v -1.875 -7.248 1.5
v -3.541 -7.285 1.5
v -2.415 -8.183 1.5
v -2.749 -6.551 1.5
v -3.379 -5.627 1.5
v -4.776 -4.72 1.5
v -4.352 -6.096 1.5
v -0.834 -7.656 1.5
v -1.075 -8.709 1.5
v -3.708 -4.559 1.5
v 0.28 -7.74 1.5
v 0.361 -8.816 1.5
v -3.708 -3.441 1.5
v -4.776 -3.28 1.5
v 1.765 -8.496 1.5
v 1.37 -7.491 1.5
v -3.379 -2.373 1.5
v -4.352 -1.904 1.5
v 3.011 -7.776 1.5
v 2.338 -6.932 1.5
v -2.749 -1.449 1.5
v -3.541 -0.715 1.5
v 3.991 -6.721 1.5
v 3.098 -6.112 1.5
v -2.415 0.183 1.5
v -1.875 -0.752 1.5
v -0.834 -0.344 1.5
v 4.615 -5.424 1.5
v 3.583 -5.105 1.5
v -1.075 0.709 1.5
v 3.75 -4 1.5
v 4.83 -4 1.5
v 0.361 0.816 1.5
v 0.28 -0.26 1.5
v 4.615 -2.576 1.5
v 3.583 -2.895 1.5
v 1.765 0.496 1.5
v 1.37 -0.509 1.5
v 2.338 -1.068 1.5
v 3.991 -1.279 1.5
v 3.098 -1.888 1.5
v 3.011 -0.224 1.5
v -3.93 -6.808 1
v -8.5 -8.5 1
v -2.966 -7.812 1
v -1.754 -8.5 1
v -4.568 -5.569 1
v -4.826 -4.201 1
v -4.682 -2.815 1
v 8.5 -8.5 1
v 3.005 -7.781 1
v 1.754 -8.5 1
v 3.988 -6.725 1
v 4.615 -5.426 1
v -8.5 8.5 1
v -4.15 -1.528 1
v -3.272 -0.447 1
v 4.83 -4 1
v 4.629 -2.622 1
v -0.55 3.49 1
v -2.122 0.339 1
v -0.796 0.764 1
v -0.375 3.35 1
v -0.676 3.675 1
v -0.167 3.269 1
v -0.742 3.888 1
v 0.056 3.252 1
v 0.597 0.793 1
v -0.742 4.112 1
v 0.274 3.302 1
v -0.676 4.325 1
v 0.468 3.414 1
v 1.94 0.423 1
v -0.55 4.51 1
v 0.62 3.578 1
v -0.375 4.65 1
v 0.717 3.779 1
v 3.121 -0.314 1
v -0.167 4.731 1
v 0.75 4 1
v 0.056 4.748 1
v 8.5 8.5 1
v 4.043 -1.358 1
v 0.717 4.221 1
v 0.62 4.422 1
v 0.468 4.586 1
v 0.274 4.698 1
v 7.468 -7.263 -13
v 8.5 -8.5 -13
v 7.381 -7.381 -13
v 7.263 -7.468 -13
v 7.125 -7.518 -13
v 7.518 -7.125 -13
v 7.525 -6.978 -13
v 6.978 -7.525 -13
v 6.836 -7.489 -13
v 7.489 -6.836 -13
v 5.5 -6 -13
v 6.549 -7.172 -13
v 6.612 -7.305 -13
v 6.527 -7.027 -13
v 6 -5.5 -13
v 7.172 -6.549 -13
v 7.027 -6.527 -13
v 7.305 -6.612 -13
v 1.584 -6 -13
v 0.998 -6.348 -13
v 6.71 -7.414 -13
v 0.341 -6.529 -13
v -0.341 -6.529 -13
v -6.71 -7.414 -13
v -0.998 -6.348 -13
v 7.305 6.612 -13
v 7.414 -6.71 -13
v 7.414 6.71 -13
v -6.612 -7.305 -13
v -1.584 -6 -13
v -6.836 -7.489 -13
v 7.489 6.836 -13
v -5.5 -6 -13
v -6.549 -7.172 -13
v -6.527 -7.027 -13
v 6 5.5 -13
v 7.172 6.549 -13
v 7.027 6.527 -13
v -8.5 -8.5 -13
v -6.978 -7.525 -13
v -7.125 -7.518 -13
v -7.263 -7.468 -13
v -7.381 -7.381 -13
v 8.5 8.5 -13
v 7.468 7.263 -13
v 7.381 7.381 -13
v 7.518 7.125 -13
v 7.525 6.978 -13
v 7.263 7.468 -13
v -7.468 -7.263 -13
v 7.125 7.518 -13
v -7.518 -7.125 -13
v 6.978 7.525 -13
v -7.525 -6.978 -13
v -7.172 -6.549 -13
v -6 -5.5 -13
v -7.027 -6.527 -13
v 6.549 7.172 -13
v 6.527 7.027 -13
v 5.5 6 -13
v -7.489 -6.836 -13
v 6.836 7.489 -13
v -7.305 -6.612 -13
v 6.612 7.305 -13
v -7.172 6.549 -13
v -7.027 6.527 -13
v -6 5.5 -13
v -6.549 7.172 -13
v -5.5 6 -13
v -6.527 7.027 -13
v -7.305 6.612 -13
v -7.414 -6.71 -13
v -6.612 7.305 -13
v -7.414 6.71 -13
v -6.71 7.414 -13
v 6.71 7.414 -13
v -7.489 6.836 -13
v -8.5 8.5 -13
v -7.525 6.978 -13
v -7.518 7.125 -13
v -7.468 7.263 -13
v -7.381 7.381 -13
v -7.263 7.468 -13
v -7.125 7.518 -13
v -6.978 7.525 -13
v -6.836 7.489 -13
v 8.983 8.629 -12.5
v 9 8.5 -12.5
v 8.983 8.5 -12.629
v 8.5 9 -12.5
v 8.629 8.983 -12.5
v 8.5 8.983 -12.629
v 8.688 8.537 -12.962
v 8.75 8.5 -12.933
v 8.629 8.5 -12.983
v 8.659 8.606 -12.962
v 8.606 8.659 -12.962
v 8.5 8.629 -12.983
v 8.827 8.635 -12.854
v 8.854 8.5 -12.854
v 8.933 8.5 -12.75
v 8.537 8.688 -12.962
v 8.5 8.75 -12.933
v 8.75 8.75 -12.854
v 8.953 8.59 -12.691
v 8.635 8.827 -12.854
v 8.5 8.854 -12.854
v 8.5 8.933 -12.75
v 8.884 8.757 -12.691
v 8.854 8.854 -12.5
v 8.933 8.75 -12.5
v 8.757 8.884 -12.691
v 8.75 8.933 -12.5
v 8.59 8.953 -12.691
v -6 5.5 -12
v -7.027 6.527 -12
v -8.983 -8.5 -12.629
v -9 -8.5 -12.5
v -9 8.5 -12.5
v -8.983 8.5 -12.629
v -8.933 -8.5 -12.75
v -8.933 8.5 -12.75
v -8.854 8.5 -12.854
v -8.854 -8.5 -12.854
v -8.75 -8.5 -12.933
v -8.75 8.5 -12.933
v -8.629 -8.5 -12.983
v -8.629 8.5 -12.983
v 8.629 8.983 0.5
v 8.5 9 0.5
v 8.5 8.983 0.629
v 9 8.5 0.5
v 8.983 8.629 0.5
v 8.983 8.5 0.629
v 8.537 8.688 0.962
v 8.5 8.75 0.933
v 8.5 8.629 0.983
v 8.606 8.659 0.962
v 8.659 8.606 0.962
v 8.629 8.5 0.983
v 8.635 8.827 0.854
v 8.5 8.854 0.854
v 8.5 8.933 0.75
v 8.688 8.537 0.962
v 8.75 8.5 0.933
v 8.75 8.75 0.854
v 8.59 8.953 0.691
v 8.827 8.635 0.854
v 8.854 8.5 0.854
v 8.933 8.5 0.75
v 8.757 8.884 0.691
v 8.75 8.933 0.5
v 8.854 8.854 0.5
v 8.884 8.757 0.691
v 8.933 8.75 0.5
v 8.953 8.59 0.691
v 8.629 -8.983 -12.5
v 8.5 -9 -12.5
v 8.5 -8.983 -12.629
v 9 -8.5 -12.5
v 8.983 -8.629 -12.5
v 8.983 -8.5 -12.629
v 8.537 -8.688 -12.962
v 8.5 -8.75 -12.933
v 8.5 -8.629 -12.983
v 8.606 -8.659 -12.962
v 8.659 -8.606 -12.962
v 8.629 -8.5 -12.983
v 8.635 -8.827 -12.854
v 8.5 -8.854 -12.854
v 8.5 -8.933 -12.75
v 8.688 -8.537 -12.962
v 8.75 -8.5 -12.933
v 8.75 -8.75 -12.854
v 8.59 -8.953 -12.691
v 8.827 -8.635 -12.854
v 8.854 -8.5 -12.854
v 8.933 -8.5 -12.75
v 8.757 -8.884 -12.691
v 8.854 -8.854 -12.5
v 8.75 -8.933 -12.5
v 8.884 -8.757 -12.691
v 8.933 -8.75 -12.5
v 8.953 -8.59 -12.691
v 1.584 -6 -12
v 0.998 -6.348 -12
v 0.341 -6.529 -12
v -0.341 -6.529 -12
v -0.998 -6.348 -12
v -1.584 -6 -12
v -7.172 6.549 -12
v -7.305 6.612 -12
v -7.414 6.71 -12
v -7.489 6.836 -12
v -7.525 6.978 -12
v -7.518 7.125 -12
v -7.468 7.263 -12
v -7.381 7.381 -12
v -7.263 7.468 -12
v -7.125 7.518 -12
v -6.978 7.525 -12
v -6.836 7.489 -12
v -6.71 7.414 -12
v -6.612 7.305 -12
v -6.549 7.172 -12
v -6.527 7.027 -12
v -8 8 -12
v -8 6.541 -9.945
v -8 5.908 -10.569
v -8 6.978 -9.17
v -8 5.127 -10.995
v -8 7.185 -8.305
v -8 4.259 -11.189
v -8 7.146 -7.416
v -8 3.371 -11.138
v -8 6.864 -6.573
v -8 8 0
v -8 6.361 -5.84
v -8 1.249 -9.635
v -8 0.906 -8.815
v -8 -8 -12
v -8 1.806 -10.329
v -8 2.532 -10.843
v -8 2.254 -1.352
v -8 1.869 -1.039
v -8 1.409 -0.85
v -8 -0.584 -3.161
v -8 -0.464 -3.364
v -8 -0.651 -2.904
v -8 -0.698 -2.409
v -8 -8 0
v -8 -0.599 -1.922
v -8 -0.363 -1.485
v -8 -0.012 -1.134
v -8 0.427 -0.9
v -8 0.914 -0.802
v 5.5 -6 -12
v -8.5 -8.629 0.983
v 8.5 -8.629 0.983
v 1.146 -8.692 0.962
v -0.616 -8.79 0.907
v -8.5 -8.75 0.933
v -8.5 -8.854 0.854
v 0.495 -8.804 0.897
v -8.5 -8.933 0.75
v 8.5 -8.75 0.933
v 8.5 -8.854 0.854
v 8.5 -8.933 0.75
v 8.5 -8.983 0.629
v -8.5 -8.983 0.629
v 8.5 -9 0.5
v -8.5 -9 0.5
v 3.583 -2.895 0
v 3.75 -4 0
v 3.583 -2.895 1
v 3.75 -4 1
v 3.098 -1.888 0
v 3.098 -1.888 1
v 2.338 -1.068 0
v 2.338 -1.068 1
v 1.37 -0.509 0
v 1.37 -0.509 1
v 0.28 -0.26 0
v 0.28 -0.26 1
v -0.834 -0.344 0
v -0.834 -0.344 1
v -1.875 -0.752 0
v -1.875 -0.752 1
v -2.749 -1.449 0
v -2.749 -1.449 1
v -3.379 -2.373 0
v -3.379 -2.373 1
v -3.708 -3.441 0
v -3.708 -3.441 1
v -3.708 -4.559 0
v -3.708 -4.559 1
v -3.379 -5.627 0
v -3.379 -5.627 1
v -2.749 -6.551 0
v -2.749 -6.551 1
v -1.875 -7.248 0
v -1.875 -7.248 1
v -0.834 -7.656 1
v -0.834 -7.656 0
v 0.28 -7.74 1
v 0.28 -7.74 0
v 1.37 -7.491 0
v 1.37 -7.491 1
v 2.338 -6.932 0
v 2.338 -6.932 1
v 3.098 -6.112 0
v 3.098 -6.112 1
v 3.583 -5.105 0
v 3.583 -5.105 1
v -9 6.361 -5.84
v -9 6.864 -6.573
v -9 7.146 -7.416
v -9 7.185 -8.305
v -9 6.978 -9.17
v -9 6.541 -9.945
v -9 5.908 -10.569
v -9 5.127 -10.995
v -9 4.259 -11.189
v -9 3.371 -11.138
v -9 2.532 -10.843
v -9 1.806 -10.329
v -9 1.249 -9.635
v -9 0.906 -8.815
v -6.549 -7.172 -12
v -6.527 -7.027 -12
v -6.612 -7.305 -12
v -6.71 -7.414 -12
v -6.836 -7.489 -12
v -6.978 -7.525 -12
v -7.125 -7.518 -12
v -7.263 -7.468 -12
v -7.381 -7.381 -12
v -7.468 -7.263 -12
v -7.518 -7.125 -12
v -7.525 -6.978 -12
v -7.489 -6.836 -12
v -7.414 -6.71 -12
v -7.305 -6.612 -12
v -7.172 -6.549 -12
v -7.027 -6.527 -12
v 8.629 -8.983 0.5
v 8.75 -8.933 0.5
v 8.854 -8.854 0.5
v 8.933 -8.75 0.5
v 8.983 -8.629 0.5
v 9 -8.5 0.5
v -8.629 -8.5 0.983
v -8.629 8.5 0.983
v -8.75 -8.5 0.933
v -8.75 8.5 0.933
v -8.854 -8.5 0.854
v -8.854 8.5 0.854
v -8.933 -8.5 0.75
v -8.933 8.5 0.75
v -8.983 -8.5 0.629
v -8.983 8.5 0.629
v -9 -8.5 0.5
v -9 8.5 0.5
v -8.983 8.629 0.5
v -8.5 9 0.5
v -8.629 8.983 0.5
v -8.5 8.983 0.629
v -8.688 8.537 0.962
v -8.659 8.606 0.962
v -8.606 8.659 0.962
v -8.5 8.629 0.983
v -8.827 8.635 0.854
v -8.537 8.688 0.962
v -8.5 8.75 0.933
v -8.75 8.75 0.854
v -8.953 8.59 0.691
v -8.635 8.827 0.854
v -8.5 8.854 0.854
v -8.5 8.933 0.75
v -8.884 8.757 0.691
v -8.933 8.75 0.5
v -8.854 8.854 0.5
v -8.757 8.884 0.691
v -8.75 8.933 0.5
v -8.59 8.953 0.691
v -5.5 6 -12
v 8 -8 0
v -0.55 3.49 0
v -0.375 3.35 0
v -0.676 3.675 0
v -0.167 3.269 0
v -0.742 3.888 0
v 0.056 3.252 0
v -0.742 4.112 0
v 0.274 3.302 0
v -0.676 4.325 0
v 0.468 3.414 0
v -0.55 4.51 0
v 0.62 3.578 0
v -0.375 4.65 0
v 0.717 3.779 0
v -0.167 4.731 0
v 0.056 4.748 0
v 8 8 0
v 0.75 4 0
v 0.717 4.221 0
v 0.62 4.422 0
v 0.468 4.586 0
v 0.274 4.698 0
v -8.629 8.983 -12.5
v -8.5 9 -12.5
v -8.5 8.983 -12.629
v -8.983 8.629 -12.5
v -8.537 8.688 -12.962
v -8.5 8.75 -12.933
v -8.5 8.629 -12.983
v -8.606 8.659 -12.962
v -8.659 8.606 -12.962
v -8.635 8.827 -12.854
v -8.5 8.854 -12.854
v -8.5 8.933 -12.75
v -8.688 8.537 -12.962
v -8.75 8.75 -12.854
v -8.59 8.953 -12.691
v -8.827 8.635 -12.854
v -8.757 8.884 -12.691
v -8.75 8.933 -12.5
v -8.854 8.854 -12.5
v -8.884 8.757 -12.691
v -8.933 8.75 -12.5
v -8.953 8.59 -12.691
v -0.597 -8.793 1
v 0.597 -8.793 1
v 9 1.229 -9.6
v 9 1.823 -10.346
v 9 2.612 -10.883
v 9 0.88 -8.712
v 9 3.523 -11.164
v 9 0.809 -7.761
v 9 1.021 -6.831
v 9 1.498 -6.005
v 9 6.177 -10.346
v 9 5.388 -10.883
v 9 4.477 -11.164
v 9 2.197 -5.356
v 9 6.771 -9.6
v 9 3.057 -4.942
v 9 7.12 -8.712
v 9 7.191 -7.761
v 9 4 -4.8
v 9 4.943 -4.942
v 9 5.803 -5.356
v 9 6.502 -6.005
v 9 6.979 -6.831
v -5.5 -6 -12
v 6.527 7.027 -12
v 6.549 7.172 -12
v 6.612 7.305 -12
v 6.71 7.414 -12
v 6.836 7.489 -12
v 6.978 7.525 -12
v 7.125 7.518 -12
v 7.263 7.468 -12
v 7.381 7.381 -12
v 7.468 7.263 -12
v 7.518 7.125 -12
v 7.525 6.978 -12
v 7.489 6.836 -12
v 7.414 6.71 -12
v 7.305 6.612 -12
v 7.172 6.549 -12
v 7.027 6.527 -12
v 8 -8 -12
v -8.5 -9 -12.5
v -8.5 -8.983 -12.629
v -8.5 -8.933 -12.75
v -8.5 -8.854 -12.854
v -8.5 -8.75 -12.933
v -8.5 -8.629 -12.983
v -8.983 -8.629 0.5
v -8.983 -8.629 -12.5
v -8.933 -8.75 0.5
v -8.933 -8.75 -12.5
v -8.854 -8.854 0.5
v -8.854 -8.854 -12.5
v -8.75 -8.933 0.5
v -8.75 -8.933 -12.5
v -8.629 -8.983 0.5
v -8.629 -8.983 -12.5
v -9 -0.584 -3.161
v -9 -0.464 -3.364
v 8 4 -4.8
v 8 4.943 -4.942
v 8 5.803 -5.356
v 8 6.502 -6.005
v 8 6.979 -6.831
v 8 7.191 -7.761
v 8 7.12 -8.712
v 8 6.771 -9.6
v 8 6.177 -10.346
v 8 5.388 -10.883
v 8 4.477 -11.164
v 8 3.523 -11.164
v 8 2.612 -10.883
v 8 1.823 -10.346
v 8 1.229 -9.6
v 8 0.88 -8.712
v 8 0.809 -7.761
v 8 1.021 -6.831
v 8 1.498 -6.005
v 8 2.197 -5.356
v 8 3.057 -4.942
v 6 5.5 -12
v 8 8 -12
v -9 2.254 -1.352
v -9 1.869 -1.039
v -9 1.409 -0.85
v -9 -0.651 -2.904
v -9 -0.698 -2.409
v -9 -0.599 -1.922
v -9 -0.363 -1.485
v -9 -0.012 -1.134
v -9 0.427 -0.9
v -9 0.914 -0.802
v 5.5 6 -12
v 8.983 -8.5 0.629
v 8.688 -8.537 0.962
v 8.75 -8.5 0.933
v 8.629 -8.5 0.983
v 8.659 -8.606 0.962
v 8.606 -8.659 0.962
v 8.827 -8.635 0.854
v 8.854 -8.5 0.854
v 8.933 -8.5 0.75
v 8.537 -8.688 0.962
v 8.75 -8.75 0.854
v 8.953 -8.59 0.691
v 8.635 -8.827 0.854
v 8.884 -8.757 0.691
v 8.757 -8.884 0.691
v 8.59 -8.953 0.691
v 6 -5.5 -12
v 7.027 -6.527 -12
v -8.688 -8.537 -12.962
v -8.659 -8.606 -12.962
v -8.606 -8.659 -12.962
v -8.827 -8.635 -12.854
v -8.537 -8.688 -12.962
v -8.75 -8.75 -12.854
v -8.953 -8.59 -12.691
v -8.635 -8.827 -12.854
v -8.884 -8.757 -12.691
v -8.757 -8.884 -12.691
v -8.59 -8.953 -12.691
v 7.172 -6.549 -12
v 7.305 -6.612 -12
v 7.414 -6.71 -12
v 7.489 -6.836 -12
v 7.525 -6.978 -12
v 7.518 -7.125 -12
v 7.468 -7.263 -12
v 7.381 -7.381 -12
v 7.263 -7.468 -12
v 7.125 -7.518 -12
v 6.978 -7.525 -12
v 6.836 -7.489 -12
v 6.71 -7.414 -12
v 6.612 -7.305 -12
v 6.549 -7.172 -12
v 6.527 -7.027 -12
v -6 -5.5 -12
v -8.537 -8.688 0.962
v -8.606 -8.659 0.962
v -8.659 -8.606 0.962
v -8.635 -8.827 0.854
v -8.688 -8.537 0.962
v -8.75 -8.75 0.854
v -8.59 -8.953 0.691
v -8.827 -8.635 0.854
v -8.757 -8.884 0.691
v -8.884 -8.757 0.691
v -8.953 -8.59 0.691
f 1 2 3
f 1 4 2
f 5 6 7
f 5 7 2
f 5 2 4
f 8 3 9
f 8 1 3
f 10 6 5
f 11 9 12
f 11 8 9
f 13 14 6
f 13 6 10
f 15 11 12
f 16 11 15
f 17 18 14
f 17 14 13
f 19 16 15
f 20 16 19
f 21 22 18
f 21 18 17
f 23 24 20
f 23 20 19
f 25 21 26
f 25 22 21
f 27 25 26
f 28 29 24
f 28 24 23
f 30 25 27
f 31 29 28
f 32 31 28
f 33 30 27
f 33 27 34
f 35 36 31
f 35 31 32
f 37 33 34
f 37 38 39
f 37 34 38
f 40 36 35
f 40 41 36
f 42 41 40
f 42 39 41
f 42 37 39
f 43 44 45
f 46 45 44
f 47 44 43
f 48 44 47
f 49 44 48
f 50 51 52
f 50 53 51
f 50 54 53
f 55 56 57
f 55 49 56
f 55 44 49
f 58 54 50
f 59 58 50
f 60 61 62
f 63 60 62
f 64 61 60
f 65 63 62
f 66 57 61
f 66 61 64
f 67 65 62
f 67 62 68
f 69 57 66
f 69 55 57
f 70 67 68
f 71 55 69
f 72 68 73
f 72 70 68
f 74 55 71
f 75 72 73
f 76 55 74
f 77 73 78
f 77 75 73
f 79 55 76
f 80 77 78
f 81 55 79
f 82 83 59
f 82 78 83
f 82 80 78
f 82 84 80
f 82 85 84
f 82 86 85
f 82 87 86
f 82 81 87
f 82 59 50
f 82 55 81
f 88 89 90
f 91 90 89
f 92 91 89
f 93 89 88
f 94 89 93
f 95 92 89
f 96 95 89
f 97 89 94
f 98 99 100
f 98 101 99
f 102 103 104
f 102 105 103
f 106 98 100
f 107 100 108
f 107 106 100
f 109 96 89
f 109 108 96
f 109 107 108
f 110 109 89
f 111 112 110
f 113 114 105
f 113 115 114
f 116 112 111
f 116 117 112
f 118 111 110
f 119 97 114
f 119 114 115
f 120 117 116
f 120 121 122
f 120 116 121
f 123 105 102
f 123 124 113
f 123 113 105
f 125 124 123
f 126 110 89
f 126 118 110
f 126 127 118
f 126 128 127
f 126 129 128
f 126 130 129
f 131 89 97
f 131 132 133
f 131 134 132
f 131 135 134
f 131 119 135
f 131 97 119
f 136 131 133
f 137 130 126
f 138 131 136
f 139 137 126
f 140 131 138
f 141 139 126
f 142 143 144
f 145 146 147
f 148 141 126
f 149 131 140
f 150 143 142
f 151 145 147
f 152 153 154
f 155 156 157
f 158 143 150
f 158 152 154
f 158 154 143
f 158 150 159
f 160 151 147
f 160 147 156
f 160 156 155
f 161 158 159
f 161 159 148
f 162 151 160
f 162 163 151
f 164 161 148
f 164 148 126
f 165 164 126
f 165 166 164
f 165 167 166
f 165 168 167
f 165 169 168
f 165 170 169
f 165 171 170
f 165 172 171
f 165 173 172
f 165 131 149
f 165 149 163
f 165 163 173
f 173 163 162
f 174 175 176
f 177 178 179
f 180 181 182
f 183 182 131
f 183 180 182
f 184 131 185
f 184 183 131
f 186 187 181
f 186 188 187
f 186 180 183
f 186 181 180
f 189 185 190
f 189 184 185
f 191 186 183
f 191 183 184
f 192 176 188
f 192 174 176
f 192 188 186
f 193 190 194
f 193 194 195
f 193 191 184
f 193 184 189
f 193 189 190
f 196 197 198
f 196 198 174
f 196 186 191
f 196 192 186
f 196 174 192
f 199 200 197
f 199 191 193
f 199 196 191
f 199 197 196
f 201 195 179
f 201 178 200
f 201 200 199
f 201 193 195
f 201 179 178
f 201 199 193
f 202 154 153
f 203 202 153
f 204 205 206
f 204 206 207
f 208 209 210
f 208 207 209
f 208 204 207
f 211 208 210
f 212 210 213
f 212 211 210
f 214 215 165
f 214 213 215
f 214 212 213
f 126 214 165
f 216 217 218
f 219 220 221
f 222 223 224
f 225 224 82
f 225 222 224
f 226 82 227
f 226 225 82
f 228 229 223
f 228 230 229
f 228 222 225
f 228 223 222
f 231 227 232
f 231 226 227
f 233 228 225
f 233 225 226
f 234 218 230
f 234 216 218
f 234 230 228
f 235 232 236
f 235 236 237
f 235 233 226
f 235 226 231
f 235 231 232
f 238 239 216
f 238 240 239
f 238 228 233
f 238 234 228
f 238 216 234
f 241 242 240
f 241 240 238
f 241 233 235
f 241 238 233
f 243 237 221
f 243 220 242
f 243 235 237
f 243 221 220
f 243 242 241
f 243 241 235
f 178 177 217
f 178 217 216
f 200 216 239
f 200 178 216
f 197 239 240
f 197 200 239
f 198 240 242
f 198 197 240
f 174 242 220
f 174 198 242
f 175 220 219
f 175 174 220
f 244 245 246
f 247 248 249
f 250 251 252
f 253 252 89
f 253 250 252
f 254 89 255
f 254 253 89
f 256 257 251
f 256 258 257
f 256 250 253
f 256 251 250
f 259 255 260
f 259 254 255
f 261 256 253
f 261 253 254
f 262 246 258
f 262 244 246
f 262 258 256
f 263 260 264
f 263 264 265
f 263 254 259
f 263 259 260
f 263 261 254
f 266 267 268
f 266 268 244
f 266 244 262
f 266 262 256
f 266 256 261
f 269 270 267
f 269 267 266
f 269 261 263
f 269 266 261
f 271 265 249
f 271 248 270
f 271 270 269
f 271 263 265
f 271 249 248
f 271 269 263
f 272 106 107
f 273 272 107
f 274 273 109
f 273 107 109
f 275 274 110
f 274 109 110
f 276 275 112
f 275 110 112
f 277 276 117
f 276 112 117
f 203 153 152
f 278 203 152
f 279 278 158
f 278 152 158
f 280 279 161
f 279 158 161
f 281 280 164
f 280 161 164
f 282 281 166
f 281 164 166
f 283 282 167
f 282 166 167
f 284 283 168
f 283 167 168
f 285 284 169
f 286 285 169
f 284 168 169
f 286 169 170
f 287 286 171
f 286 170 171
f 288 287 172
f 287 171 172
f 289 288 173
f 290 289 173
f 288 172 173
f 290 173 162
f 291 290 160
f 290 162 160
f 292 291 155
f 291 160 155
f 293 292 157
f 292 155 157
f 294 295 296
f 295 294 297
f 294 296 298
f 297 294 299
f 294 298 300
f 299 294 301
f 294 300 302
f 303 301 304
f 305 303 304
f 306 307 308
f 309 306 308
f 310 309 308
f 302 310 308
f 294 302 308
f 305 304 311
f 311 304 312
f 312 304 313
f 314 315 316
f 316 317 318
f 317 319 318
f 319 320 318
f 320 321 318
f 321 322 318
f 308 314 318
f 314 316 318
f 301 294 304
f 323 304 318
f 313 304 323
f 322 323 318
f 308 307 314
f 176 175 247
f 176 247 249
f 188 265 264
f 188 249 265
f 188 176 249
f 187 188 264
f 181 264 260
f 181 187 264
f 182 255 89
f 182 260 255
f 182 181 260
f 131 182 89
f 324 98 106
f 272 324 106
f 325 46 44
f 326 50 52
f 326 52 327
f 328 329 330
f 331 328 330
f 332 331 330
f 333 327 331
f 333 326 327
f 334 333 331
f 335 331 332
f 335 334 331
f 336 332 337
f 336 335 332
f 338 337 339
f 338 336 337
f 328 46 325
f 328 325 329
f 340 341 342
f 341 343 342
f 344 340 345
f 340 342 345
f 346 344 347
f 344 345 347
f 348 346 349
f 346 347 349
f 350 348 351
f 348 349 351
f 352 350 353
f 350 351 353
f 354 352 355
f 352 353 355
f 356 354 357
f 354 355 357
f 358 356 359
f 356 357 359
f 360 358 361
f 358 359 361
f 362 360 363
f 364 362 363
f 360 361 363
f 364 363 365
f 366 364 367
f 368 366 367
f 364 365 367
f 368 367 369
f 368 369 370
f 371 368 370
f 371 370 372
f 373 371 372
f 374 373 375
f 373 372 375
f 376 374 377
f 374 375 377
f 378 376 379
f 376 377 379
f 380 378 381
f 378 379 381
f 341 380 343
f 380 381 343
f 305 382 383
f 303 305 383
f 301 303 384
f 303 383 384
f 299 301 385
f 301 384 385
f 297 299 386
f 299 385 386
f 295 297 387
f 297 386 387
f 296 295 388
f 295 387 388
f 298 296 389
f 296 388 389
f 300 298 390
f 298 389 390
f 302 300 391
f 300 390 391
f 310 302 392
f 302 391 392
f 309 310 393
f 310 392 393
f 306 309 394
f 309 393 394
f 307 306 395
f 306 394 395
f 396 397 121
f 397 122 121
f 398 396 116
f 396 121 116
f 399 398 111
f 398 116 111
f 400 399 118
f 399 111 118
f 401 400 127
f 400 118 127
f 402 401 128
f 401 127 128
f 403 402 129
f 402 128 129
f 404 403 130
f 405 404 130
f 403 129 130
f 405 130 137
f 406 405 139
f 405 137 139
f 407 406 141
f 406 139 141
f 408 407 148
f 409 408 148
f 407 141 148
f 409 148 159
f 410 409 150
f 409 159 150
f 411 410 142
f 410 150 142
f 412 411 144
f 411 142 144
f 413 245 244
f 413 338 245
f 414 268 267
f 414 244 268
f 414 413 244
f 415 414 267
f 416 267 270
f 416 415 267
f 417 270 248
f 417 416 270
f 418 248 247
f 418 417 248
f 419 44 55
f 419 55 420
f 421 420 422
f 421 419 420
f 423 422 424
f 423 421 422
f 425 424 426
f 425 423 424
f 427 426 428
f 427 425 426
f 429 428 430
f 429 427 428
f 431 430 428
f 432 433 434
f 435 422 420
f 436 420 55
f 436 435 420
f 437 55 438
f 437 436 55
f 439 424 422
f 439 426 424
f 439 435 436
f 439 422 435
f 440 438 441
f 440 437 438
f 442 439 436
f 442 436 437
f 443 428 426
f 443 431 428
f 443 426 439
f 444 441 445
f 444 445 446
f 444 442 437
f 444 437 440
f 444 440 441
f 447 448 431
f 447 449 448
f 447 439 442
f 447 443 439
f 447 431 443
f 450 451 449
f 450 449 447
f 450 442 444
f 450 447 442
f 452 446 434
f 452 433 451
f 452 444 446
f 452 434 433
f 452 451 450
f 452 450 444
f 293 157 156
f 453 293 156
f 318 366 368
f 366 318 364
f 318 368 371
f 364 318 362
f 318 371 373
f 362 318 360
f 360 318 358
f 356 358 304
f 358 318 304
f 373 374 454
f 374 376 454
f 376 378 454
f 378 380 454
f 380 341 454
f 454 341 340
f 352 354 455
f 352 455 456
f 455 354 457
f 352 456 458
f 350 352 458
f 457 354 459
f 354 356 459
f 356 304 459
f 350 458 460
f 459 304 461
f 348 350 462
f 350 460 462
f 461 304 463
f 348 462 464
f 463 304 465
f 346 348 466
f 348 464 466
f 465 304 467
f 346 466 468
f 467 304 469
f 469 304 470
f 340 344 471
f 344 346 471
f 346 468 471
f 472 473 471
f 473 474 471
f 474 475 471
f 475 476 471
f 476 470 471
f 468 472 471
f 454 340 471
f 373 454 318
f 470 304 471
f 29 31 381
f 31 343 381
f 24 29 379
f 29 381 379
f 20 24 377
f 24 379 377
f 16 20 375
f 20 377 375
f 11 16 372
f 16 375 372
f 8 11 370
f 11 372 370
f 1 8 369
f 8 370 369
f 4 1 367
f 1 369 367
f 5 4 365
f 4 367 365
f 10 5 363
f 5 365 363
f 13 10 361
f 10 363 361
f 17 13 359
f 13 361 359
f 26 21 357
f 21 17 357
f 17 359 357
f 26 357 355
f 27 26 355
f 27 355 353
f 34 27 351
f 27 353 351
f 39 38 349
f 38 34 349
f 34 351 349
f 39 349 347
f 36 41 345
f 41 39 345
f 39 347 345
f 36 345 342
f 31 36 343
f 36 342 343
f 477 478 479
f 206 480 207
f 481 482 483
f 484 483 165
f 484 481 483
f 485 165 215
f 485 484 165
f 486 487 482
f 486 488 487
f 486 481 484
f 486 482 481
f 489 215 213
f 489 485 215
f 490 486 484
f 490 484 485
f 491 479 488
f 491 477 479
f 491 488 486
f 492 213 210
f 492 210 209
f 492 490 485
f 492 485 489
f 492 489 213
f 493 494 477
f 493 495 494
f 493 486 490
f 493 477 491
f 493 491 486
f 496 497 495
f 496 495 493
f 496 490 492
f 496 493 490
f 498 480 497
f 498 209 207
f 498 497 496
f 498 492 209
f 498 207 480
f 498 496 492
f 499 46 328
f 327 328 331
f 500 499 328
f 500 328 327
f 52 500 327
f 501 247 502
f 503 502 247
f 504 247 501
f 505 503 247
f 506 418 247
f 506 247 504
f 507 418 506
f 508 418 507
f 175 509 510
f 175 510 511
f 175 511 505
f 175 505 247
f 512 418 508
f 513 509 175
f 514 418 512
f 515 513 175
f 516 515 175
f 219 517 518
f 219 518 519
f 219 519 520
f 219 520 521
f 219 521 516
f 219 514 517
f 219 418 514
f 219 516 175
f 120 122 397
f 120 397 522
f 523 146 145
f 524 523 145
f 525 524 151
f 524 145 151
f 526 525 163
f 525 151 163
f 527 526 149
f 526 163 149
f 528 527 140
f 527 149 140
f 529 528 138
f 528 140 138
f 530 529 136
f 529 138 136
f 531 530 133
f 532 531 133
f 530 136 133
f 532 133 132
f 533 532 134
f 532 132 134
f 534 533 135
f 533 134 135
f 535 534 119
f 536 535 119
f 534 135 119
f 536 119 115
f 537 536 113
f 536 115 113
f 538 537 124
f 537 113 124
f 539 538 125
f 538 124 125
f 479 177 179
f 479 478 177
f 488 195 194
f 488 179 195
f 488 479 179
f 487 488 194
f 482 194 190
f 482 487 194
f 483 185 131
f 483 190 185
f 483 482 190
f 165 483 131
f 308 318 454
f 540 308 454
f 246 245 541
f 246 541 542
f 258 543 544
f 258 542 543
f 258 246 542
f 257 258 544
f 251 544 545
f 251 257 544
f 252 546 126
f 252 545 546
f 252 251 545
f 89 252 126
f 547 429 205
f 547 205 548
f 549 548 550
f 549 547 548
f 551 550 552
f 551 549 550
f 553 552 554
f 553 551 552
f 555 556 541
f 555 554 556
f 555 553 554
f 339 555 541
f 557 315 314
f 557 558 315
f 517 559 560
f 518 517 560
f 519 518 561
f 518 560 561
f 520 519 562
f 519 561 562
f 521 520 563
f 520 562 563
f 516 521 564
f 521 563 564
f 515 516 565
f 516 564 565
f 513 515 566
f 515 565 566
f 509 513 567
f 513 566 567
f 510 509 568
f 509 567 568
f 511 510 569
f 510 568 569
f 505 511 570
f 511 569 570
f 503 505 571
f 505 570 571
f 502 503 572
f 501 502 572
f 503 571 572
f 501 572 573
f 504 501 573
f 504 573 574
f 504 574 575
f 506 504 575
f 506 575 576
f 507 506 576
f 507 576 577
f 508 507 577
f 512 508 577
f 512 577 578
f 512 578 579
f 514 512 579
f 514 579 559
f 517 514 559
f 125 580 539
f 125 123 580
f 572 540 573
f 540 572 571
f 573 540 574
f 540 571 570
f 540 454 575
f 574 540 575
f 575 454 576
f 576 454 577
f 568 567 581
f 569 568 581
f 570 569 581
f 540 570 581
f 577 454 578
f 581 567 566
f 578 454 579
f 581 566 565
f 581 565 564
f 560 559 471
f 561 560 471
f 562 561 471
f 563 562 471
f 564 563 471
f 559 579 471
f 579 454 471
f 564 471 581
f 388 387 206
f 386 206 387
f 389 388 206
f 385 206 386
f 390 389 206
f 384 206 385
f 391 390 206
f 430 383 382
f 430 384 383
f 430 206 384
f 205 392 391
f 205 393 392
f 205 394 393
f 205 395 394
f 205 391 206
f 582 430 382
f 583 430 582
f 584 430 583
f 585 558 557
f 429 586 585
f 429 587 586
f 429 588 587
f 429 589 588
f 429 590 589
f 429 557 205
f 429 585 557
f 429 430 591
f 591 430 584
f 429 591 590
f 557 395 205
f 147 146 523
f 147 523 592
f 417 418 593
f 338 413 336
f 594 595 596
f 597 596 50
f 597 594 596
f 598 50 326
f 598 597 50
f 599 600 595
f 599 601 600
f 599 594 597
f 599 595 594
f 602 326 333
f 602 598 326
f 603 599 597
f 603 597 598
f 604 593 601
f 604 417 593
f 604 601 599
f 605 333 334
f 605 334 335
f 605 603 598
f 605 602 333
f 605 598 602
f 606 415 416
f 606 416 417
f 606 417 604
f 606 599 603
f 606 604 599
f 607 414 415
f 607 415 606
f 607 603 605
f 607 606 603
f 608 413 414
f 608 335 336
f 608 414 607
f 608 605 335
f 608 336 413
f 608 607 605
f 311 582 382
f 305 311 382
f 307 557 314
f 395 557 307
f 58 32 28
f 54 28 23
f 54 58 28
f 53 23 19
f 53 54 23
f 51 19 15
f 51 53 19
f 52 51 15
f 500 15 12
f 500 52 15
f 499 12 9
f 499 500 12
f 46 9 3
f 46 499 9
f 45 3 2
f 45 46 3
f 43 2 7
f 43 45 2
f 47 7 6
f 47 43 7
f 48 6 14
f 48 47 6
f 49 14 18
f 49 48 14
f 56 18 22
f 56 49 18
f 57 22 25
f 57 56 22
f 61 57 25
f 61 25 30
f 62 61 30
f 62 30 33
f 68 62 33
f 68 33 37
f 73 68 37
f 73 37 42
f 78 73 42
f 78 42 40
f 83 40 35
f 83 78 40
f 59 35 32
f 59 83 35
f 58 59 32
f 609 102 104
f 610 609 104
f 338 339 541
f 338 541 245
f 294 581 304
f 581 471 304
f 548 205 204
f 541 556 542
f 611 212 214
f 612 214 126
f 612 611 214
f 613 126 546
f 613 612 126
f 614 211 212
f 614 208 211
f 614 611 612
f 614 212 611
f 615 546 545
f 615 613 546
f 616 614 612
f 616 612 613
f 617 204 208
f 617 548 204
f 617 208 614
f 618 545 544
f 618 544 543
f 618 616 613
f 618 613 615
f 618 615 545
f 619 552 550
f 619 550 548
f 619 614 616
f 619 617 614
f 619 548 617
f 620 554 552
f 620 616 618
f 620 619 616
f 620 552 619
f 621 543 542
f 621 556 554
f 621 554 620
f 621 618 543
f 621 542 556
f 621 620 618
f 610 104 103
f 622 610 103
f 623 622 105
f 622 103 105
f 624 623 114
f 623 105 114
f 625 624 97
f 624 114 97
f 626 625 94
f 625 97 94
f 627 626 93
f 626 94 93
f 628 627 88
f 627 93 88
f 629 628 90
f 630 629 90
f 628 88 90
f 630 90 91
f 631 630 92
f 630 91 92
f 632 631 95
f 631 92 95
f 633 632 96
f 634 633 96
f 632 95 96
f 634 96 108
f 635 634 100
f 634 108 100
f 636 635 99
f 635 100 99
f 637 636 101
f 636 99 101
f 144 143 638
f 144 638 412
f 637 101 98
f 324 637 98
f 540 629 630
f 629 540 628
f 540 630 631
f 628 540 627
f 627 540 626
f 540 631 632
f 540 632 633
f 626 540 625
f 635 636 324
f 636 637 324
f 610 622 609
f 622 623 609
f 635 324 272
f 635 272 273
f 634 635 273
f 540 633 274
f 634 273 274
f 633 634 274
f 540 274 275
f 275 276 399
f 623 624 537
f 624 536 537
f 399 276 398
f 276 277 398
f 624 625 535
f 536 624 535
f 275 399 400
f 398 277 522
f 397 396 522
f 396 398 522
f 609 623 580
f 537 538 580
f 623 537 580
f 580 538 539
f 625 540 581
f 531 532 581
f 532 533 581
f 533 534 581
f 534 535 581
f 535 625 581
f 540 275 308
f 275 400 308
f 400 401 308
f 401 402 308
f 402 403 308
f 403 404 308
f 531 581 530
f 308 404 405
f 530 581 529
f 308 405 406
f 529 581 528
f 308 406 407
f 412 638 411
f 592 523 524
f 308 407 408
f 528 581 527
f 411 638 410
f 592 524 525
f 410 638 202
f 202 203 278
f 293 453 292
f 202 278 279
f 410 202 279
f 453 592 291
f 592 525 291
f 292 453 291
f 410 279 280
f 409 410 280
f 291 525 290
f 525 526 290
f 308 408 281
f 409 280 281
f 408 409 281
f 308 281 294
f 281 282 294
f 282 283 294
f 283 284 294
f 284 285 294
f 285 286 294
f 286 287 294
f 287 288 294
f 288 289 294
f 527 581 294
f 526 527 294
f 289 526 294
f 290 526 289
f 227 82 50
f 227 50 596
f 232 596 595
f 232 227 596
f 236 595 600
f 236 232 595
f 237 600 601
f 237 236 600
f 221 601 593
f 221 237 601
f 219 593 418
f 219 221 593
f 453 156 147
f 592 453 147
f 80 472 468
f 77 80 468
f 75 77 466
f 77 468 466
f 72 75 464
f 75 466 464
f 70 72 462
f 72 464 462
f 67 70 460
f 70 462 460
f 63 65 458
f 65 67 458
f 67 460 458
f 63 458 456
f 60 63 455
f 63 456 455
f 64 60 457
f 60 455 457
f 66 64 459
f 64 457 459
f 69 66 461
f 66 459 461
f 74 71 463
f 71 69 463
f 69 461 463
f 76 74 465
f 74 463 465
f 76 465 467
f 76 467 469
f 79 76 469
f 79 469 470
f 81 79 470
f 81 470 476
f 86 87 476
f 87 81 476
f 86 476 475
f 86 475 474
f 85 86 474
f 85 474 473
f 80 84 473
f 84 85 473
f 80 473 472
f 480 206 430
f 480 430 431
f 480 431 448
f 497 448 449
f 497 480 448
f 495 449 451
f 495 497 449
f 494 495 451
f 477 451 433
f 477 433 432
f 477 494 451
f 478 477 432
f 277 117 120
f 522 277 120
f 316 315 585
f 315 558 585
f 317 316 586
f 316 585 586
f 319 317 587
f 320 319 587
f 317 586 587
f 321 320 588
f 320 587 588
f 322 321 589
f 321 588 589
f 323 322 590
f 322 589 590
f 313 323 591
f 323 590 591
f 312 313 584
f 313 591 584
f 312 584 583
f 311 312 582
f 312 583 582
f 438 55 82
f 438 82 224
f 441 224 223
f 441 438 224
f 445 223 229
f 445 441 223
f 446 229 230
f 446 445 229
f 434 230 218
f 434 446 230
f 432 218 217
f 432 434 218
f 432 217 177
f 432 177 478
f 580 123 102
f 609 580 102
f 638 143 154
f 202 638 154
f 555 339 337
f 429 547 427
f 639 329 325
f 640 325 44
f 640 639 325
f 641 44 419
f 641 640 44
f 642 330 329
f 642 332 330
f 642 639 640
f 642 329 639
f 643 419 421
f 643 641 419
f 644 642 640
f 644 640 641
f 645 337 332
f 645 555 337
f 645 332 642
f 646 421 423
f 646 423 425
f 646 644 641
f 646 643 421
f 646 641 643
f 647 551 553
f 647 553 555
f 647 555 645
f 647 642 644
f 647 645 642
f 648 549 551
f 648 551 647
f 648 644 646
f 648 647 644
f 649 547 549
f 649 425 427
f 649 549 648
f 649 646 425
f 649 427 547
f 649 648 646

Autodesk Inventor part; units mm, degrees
ref_plane "YZ Plane" through (0, 0, 0) normal (1, 0, 0) x (0, 1, 0)
ref_plane "XZ Plane" through (0, 0, 0) normal (0, 1, 0) x (-1, 0, 0)
ref_plane "XY Plane" through (0, 0, 0) normal (0, 0, 1) x (1, 0, 0)
sketch "Эскиз1" plane through (0, 0, 0) normal (0, 0, 1) x (1, 0, 0)
  line L0 (-8, -8) -> (8, -8)
  line L1 (8, -8) -> (8, 8)
  line L2 (8, 8) -> (-8, 8)
  line L3 (-8, 8) -> (-8, -8)
  circle A0 centre (0, -4) radius 2.3157
  circle A1 centre (0, 4) radius 0.75
  line L4 (-9, -9) -> (9, -9)
  line L5 (9, -9) -> (9, 9)
  line L6 (9, 9) -> (-9, 9)
  line L7 (-9, 9) -> (-9, -9)
  point P0 (0, 0)
  dimension "d0" = 16
  dimension "d1" = 16
  dimension "d2" = 8
  dimension "d3" = 8
  dimension "d4" = 1.5
  dimension "d5" = 4
  dimension "d6" = 4
  dimension "d7" = 1
extrude "Выдавливание1" add sketch "Эскиз1" along normal blind 1 contours L3 L2 L1 L0 | L7 L6 L5 L4
extrude "Выдавливание2" add sketch "Эскиз1" against normal blind 13 contours L7 L6 L5 L4
sketch "Эскиз2" plane through (0, 0, -13) normal (0, 0, -1) x (-1, 0, 0)
  line L0 (-8, -8) -> (-8, 8)
  line L1 (-8, 8) -> (8, 8)
  line L2 (8, 8) -> (8, -8)
  line L3 (8, -8) -> (-8, -8)
  line L4 (-9, -9) -> (9, -9)
  line L5 (9, -9) -> (9, 9)
  line L6 (9, 9) -> (-9, 9)
  line L7 (-9, 9) -> (-9, -9)
  line L8 (-6, 5.5) -> (-6, -5.5)
  line L9 (6, -5.5) -> (6, 5.5)
  line L10 (5.5, 6) -> (-5.5, 6)
  spline S0 degree 3 number of poles 196 construction
  circle A0 centre (0, -4) radius 2.3157
  arc A1 (-1.5842, -6) -> (1.5842, -6) centre (0, -4) ccw
  line L11 (-5.5, -6) -> (-1.5842, -6)
  line L12 (-1.1537, -6) -> (-1.1341, -6)
  line L13 (1.5842, -6) -> (5.5, -6)
  line L14 (1.1397, -6) -> (1.1535, -6)
  line L15 (-8, -8) -> (8, -8) construction
  line L16 (-8, -8) -> (8, 8) construction
  line L17 (8, 8) -> (-8, 8) construction
  line L18 (-8, 8) -> (8, -8) construction
  line L19 (7.0273, 7.0273) -> (-7.0273, 7.0273) construction
  line L20 (-7.0273, 7.0273) -> (-7.0273, -7.0273) construction
  line L21 (-7.0273, -7.0273) -> (7.0273, -7.0273) construction
  line L22 (7.0273, -7.0273) -> (7.0273, 7.0273) construction
  line L23 (7.0273, 7.0273) -> (-7.0273, -7.0273) construction
  line L24 (-7.0273, 7.0273) -> (7.0273, -7.0273) construction
  arc A2 (-7.0273, -6.5273) -> (-6.5273, -7.0273) centre (-7.0273, -7.0273) ccw
  arc A3 (-6.5273, 7.0273) -> (-7.0273, 6.5273) centre (-7.0273, 7.0273) ccw
  arc A4 (7.0273, 6.5273) -> (6.5273, 7.0273) centre (7.0273, 7.0273) ccw
  arc A5 (6.5273, -7.0273) -> (7.0273, -6.5273) centre (7.0273, -7.0273) ccw
  line L25 (-6, -5.5) -> (-7.0273, -6.5273)
  line L26 (-6.5273, -7.0273) -> (-5.5, -6)
  line L27 (-6, 5.5) -> (-7.0273, 6.5273)
  line L28 (-6.5273, 7.0273) -> (-5.5, 6)
  line L29 (6.5273, -7.0273) -> (5.5, -6)
  line L30 (0, -0.5) -> (-0.5, 0)
  line L31 (0, 0.5) -> (0.5, 0)
  line L32 (6, -5.5) -> (7.0273, -6.5273)
  line L33 (0, -0.5) -> (0.5, 0)
  line L34 (6, 5.5) -> (7.0273, 6.5273)
  line L35 (6.5273, 7.0273) -> (5.5, 6)
  line L36 (0, 0.5) -> (-0.5, 0)
  point P0 (0, 0)
  dimension "d12" = 2
  dimension "d16" = 1
  dimension "d17" = 1
  dimension "d18" = 1
  dimension "d19" = 1
extrude "Выдавливание3" add sketch "Эскиз2" against normal blind 1 contours L0 L1 L2 L3
fillet "Сопряжение1" radius 0.5 12 edges at (9, -9, -6) (-9, -9, -6) (-9, 9, -6) (9, 9, -6) (-9, 0, 1) (0, -9, 1) (0, 9, 1) (9, 0, 1) (0, 9, -13) (9, 0, -13) (0, -9, -13) (-9, 0, -13)
sketch "Эскиз3" plane through (0, 0, 1) normal (0, 0, 1) x (1, 0, 0)
  circle A0 centre (0, -4) radius 2.3157 projected
  circle A1 centre (0, -4) radius 2.3157
  circle A2 centre (0, -4) radius 3.75
  circle A3 centre (0, -4) radius 4.8299
  point P0 (0, 0)
  dimension "d22" = 7.5
extrude "Выдавливание4" add sketch "Эскиз3" along normal mid plane 1 contours A3
extrude "Выдавливание5" cut sketch "Эскиз3" against normal blind 1 contours A2
sketch "Эскиз4" plane through (-9, -8.5, 0.5) normal (-1, 0, 0) x (0, 0, 1)
  circle A0 centre (-8.5, 12.5) radius 3.2 projected
  circle A1 centre (-3, 9.5) radius 1.7 projected
  line L0 (-3.8644, 8.0362) -> (-3.6612, 7.9162)
  line L1 (-3.6612, 7.9162) -> (-9.3151, 9.4056)
  line L2 (-1.8523, 10.7541) -> (-6.3396, 14.8607)
  point P0 (-0.5, 8.5)
extrude "Выдавливание6" cut sketch "Эскиз4" against normal blind 20 contours A0
extrude "Выдавливание7" cut sketch "Эскиз4" against normal blind 2
properties part number "кожух  блока"
